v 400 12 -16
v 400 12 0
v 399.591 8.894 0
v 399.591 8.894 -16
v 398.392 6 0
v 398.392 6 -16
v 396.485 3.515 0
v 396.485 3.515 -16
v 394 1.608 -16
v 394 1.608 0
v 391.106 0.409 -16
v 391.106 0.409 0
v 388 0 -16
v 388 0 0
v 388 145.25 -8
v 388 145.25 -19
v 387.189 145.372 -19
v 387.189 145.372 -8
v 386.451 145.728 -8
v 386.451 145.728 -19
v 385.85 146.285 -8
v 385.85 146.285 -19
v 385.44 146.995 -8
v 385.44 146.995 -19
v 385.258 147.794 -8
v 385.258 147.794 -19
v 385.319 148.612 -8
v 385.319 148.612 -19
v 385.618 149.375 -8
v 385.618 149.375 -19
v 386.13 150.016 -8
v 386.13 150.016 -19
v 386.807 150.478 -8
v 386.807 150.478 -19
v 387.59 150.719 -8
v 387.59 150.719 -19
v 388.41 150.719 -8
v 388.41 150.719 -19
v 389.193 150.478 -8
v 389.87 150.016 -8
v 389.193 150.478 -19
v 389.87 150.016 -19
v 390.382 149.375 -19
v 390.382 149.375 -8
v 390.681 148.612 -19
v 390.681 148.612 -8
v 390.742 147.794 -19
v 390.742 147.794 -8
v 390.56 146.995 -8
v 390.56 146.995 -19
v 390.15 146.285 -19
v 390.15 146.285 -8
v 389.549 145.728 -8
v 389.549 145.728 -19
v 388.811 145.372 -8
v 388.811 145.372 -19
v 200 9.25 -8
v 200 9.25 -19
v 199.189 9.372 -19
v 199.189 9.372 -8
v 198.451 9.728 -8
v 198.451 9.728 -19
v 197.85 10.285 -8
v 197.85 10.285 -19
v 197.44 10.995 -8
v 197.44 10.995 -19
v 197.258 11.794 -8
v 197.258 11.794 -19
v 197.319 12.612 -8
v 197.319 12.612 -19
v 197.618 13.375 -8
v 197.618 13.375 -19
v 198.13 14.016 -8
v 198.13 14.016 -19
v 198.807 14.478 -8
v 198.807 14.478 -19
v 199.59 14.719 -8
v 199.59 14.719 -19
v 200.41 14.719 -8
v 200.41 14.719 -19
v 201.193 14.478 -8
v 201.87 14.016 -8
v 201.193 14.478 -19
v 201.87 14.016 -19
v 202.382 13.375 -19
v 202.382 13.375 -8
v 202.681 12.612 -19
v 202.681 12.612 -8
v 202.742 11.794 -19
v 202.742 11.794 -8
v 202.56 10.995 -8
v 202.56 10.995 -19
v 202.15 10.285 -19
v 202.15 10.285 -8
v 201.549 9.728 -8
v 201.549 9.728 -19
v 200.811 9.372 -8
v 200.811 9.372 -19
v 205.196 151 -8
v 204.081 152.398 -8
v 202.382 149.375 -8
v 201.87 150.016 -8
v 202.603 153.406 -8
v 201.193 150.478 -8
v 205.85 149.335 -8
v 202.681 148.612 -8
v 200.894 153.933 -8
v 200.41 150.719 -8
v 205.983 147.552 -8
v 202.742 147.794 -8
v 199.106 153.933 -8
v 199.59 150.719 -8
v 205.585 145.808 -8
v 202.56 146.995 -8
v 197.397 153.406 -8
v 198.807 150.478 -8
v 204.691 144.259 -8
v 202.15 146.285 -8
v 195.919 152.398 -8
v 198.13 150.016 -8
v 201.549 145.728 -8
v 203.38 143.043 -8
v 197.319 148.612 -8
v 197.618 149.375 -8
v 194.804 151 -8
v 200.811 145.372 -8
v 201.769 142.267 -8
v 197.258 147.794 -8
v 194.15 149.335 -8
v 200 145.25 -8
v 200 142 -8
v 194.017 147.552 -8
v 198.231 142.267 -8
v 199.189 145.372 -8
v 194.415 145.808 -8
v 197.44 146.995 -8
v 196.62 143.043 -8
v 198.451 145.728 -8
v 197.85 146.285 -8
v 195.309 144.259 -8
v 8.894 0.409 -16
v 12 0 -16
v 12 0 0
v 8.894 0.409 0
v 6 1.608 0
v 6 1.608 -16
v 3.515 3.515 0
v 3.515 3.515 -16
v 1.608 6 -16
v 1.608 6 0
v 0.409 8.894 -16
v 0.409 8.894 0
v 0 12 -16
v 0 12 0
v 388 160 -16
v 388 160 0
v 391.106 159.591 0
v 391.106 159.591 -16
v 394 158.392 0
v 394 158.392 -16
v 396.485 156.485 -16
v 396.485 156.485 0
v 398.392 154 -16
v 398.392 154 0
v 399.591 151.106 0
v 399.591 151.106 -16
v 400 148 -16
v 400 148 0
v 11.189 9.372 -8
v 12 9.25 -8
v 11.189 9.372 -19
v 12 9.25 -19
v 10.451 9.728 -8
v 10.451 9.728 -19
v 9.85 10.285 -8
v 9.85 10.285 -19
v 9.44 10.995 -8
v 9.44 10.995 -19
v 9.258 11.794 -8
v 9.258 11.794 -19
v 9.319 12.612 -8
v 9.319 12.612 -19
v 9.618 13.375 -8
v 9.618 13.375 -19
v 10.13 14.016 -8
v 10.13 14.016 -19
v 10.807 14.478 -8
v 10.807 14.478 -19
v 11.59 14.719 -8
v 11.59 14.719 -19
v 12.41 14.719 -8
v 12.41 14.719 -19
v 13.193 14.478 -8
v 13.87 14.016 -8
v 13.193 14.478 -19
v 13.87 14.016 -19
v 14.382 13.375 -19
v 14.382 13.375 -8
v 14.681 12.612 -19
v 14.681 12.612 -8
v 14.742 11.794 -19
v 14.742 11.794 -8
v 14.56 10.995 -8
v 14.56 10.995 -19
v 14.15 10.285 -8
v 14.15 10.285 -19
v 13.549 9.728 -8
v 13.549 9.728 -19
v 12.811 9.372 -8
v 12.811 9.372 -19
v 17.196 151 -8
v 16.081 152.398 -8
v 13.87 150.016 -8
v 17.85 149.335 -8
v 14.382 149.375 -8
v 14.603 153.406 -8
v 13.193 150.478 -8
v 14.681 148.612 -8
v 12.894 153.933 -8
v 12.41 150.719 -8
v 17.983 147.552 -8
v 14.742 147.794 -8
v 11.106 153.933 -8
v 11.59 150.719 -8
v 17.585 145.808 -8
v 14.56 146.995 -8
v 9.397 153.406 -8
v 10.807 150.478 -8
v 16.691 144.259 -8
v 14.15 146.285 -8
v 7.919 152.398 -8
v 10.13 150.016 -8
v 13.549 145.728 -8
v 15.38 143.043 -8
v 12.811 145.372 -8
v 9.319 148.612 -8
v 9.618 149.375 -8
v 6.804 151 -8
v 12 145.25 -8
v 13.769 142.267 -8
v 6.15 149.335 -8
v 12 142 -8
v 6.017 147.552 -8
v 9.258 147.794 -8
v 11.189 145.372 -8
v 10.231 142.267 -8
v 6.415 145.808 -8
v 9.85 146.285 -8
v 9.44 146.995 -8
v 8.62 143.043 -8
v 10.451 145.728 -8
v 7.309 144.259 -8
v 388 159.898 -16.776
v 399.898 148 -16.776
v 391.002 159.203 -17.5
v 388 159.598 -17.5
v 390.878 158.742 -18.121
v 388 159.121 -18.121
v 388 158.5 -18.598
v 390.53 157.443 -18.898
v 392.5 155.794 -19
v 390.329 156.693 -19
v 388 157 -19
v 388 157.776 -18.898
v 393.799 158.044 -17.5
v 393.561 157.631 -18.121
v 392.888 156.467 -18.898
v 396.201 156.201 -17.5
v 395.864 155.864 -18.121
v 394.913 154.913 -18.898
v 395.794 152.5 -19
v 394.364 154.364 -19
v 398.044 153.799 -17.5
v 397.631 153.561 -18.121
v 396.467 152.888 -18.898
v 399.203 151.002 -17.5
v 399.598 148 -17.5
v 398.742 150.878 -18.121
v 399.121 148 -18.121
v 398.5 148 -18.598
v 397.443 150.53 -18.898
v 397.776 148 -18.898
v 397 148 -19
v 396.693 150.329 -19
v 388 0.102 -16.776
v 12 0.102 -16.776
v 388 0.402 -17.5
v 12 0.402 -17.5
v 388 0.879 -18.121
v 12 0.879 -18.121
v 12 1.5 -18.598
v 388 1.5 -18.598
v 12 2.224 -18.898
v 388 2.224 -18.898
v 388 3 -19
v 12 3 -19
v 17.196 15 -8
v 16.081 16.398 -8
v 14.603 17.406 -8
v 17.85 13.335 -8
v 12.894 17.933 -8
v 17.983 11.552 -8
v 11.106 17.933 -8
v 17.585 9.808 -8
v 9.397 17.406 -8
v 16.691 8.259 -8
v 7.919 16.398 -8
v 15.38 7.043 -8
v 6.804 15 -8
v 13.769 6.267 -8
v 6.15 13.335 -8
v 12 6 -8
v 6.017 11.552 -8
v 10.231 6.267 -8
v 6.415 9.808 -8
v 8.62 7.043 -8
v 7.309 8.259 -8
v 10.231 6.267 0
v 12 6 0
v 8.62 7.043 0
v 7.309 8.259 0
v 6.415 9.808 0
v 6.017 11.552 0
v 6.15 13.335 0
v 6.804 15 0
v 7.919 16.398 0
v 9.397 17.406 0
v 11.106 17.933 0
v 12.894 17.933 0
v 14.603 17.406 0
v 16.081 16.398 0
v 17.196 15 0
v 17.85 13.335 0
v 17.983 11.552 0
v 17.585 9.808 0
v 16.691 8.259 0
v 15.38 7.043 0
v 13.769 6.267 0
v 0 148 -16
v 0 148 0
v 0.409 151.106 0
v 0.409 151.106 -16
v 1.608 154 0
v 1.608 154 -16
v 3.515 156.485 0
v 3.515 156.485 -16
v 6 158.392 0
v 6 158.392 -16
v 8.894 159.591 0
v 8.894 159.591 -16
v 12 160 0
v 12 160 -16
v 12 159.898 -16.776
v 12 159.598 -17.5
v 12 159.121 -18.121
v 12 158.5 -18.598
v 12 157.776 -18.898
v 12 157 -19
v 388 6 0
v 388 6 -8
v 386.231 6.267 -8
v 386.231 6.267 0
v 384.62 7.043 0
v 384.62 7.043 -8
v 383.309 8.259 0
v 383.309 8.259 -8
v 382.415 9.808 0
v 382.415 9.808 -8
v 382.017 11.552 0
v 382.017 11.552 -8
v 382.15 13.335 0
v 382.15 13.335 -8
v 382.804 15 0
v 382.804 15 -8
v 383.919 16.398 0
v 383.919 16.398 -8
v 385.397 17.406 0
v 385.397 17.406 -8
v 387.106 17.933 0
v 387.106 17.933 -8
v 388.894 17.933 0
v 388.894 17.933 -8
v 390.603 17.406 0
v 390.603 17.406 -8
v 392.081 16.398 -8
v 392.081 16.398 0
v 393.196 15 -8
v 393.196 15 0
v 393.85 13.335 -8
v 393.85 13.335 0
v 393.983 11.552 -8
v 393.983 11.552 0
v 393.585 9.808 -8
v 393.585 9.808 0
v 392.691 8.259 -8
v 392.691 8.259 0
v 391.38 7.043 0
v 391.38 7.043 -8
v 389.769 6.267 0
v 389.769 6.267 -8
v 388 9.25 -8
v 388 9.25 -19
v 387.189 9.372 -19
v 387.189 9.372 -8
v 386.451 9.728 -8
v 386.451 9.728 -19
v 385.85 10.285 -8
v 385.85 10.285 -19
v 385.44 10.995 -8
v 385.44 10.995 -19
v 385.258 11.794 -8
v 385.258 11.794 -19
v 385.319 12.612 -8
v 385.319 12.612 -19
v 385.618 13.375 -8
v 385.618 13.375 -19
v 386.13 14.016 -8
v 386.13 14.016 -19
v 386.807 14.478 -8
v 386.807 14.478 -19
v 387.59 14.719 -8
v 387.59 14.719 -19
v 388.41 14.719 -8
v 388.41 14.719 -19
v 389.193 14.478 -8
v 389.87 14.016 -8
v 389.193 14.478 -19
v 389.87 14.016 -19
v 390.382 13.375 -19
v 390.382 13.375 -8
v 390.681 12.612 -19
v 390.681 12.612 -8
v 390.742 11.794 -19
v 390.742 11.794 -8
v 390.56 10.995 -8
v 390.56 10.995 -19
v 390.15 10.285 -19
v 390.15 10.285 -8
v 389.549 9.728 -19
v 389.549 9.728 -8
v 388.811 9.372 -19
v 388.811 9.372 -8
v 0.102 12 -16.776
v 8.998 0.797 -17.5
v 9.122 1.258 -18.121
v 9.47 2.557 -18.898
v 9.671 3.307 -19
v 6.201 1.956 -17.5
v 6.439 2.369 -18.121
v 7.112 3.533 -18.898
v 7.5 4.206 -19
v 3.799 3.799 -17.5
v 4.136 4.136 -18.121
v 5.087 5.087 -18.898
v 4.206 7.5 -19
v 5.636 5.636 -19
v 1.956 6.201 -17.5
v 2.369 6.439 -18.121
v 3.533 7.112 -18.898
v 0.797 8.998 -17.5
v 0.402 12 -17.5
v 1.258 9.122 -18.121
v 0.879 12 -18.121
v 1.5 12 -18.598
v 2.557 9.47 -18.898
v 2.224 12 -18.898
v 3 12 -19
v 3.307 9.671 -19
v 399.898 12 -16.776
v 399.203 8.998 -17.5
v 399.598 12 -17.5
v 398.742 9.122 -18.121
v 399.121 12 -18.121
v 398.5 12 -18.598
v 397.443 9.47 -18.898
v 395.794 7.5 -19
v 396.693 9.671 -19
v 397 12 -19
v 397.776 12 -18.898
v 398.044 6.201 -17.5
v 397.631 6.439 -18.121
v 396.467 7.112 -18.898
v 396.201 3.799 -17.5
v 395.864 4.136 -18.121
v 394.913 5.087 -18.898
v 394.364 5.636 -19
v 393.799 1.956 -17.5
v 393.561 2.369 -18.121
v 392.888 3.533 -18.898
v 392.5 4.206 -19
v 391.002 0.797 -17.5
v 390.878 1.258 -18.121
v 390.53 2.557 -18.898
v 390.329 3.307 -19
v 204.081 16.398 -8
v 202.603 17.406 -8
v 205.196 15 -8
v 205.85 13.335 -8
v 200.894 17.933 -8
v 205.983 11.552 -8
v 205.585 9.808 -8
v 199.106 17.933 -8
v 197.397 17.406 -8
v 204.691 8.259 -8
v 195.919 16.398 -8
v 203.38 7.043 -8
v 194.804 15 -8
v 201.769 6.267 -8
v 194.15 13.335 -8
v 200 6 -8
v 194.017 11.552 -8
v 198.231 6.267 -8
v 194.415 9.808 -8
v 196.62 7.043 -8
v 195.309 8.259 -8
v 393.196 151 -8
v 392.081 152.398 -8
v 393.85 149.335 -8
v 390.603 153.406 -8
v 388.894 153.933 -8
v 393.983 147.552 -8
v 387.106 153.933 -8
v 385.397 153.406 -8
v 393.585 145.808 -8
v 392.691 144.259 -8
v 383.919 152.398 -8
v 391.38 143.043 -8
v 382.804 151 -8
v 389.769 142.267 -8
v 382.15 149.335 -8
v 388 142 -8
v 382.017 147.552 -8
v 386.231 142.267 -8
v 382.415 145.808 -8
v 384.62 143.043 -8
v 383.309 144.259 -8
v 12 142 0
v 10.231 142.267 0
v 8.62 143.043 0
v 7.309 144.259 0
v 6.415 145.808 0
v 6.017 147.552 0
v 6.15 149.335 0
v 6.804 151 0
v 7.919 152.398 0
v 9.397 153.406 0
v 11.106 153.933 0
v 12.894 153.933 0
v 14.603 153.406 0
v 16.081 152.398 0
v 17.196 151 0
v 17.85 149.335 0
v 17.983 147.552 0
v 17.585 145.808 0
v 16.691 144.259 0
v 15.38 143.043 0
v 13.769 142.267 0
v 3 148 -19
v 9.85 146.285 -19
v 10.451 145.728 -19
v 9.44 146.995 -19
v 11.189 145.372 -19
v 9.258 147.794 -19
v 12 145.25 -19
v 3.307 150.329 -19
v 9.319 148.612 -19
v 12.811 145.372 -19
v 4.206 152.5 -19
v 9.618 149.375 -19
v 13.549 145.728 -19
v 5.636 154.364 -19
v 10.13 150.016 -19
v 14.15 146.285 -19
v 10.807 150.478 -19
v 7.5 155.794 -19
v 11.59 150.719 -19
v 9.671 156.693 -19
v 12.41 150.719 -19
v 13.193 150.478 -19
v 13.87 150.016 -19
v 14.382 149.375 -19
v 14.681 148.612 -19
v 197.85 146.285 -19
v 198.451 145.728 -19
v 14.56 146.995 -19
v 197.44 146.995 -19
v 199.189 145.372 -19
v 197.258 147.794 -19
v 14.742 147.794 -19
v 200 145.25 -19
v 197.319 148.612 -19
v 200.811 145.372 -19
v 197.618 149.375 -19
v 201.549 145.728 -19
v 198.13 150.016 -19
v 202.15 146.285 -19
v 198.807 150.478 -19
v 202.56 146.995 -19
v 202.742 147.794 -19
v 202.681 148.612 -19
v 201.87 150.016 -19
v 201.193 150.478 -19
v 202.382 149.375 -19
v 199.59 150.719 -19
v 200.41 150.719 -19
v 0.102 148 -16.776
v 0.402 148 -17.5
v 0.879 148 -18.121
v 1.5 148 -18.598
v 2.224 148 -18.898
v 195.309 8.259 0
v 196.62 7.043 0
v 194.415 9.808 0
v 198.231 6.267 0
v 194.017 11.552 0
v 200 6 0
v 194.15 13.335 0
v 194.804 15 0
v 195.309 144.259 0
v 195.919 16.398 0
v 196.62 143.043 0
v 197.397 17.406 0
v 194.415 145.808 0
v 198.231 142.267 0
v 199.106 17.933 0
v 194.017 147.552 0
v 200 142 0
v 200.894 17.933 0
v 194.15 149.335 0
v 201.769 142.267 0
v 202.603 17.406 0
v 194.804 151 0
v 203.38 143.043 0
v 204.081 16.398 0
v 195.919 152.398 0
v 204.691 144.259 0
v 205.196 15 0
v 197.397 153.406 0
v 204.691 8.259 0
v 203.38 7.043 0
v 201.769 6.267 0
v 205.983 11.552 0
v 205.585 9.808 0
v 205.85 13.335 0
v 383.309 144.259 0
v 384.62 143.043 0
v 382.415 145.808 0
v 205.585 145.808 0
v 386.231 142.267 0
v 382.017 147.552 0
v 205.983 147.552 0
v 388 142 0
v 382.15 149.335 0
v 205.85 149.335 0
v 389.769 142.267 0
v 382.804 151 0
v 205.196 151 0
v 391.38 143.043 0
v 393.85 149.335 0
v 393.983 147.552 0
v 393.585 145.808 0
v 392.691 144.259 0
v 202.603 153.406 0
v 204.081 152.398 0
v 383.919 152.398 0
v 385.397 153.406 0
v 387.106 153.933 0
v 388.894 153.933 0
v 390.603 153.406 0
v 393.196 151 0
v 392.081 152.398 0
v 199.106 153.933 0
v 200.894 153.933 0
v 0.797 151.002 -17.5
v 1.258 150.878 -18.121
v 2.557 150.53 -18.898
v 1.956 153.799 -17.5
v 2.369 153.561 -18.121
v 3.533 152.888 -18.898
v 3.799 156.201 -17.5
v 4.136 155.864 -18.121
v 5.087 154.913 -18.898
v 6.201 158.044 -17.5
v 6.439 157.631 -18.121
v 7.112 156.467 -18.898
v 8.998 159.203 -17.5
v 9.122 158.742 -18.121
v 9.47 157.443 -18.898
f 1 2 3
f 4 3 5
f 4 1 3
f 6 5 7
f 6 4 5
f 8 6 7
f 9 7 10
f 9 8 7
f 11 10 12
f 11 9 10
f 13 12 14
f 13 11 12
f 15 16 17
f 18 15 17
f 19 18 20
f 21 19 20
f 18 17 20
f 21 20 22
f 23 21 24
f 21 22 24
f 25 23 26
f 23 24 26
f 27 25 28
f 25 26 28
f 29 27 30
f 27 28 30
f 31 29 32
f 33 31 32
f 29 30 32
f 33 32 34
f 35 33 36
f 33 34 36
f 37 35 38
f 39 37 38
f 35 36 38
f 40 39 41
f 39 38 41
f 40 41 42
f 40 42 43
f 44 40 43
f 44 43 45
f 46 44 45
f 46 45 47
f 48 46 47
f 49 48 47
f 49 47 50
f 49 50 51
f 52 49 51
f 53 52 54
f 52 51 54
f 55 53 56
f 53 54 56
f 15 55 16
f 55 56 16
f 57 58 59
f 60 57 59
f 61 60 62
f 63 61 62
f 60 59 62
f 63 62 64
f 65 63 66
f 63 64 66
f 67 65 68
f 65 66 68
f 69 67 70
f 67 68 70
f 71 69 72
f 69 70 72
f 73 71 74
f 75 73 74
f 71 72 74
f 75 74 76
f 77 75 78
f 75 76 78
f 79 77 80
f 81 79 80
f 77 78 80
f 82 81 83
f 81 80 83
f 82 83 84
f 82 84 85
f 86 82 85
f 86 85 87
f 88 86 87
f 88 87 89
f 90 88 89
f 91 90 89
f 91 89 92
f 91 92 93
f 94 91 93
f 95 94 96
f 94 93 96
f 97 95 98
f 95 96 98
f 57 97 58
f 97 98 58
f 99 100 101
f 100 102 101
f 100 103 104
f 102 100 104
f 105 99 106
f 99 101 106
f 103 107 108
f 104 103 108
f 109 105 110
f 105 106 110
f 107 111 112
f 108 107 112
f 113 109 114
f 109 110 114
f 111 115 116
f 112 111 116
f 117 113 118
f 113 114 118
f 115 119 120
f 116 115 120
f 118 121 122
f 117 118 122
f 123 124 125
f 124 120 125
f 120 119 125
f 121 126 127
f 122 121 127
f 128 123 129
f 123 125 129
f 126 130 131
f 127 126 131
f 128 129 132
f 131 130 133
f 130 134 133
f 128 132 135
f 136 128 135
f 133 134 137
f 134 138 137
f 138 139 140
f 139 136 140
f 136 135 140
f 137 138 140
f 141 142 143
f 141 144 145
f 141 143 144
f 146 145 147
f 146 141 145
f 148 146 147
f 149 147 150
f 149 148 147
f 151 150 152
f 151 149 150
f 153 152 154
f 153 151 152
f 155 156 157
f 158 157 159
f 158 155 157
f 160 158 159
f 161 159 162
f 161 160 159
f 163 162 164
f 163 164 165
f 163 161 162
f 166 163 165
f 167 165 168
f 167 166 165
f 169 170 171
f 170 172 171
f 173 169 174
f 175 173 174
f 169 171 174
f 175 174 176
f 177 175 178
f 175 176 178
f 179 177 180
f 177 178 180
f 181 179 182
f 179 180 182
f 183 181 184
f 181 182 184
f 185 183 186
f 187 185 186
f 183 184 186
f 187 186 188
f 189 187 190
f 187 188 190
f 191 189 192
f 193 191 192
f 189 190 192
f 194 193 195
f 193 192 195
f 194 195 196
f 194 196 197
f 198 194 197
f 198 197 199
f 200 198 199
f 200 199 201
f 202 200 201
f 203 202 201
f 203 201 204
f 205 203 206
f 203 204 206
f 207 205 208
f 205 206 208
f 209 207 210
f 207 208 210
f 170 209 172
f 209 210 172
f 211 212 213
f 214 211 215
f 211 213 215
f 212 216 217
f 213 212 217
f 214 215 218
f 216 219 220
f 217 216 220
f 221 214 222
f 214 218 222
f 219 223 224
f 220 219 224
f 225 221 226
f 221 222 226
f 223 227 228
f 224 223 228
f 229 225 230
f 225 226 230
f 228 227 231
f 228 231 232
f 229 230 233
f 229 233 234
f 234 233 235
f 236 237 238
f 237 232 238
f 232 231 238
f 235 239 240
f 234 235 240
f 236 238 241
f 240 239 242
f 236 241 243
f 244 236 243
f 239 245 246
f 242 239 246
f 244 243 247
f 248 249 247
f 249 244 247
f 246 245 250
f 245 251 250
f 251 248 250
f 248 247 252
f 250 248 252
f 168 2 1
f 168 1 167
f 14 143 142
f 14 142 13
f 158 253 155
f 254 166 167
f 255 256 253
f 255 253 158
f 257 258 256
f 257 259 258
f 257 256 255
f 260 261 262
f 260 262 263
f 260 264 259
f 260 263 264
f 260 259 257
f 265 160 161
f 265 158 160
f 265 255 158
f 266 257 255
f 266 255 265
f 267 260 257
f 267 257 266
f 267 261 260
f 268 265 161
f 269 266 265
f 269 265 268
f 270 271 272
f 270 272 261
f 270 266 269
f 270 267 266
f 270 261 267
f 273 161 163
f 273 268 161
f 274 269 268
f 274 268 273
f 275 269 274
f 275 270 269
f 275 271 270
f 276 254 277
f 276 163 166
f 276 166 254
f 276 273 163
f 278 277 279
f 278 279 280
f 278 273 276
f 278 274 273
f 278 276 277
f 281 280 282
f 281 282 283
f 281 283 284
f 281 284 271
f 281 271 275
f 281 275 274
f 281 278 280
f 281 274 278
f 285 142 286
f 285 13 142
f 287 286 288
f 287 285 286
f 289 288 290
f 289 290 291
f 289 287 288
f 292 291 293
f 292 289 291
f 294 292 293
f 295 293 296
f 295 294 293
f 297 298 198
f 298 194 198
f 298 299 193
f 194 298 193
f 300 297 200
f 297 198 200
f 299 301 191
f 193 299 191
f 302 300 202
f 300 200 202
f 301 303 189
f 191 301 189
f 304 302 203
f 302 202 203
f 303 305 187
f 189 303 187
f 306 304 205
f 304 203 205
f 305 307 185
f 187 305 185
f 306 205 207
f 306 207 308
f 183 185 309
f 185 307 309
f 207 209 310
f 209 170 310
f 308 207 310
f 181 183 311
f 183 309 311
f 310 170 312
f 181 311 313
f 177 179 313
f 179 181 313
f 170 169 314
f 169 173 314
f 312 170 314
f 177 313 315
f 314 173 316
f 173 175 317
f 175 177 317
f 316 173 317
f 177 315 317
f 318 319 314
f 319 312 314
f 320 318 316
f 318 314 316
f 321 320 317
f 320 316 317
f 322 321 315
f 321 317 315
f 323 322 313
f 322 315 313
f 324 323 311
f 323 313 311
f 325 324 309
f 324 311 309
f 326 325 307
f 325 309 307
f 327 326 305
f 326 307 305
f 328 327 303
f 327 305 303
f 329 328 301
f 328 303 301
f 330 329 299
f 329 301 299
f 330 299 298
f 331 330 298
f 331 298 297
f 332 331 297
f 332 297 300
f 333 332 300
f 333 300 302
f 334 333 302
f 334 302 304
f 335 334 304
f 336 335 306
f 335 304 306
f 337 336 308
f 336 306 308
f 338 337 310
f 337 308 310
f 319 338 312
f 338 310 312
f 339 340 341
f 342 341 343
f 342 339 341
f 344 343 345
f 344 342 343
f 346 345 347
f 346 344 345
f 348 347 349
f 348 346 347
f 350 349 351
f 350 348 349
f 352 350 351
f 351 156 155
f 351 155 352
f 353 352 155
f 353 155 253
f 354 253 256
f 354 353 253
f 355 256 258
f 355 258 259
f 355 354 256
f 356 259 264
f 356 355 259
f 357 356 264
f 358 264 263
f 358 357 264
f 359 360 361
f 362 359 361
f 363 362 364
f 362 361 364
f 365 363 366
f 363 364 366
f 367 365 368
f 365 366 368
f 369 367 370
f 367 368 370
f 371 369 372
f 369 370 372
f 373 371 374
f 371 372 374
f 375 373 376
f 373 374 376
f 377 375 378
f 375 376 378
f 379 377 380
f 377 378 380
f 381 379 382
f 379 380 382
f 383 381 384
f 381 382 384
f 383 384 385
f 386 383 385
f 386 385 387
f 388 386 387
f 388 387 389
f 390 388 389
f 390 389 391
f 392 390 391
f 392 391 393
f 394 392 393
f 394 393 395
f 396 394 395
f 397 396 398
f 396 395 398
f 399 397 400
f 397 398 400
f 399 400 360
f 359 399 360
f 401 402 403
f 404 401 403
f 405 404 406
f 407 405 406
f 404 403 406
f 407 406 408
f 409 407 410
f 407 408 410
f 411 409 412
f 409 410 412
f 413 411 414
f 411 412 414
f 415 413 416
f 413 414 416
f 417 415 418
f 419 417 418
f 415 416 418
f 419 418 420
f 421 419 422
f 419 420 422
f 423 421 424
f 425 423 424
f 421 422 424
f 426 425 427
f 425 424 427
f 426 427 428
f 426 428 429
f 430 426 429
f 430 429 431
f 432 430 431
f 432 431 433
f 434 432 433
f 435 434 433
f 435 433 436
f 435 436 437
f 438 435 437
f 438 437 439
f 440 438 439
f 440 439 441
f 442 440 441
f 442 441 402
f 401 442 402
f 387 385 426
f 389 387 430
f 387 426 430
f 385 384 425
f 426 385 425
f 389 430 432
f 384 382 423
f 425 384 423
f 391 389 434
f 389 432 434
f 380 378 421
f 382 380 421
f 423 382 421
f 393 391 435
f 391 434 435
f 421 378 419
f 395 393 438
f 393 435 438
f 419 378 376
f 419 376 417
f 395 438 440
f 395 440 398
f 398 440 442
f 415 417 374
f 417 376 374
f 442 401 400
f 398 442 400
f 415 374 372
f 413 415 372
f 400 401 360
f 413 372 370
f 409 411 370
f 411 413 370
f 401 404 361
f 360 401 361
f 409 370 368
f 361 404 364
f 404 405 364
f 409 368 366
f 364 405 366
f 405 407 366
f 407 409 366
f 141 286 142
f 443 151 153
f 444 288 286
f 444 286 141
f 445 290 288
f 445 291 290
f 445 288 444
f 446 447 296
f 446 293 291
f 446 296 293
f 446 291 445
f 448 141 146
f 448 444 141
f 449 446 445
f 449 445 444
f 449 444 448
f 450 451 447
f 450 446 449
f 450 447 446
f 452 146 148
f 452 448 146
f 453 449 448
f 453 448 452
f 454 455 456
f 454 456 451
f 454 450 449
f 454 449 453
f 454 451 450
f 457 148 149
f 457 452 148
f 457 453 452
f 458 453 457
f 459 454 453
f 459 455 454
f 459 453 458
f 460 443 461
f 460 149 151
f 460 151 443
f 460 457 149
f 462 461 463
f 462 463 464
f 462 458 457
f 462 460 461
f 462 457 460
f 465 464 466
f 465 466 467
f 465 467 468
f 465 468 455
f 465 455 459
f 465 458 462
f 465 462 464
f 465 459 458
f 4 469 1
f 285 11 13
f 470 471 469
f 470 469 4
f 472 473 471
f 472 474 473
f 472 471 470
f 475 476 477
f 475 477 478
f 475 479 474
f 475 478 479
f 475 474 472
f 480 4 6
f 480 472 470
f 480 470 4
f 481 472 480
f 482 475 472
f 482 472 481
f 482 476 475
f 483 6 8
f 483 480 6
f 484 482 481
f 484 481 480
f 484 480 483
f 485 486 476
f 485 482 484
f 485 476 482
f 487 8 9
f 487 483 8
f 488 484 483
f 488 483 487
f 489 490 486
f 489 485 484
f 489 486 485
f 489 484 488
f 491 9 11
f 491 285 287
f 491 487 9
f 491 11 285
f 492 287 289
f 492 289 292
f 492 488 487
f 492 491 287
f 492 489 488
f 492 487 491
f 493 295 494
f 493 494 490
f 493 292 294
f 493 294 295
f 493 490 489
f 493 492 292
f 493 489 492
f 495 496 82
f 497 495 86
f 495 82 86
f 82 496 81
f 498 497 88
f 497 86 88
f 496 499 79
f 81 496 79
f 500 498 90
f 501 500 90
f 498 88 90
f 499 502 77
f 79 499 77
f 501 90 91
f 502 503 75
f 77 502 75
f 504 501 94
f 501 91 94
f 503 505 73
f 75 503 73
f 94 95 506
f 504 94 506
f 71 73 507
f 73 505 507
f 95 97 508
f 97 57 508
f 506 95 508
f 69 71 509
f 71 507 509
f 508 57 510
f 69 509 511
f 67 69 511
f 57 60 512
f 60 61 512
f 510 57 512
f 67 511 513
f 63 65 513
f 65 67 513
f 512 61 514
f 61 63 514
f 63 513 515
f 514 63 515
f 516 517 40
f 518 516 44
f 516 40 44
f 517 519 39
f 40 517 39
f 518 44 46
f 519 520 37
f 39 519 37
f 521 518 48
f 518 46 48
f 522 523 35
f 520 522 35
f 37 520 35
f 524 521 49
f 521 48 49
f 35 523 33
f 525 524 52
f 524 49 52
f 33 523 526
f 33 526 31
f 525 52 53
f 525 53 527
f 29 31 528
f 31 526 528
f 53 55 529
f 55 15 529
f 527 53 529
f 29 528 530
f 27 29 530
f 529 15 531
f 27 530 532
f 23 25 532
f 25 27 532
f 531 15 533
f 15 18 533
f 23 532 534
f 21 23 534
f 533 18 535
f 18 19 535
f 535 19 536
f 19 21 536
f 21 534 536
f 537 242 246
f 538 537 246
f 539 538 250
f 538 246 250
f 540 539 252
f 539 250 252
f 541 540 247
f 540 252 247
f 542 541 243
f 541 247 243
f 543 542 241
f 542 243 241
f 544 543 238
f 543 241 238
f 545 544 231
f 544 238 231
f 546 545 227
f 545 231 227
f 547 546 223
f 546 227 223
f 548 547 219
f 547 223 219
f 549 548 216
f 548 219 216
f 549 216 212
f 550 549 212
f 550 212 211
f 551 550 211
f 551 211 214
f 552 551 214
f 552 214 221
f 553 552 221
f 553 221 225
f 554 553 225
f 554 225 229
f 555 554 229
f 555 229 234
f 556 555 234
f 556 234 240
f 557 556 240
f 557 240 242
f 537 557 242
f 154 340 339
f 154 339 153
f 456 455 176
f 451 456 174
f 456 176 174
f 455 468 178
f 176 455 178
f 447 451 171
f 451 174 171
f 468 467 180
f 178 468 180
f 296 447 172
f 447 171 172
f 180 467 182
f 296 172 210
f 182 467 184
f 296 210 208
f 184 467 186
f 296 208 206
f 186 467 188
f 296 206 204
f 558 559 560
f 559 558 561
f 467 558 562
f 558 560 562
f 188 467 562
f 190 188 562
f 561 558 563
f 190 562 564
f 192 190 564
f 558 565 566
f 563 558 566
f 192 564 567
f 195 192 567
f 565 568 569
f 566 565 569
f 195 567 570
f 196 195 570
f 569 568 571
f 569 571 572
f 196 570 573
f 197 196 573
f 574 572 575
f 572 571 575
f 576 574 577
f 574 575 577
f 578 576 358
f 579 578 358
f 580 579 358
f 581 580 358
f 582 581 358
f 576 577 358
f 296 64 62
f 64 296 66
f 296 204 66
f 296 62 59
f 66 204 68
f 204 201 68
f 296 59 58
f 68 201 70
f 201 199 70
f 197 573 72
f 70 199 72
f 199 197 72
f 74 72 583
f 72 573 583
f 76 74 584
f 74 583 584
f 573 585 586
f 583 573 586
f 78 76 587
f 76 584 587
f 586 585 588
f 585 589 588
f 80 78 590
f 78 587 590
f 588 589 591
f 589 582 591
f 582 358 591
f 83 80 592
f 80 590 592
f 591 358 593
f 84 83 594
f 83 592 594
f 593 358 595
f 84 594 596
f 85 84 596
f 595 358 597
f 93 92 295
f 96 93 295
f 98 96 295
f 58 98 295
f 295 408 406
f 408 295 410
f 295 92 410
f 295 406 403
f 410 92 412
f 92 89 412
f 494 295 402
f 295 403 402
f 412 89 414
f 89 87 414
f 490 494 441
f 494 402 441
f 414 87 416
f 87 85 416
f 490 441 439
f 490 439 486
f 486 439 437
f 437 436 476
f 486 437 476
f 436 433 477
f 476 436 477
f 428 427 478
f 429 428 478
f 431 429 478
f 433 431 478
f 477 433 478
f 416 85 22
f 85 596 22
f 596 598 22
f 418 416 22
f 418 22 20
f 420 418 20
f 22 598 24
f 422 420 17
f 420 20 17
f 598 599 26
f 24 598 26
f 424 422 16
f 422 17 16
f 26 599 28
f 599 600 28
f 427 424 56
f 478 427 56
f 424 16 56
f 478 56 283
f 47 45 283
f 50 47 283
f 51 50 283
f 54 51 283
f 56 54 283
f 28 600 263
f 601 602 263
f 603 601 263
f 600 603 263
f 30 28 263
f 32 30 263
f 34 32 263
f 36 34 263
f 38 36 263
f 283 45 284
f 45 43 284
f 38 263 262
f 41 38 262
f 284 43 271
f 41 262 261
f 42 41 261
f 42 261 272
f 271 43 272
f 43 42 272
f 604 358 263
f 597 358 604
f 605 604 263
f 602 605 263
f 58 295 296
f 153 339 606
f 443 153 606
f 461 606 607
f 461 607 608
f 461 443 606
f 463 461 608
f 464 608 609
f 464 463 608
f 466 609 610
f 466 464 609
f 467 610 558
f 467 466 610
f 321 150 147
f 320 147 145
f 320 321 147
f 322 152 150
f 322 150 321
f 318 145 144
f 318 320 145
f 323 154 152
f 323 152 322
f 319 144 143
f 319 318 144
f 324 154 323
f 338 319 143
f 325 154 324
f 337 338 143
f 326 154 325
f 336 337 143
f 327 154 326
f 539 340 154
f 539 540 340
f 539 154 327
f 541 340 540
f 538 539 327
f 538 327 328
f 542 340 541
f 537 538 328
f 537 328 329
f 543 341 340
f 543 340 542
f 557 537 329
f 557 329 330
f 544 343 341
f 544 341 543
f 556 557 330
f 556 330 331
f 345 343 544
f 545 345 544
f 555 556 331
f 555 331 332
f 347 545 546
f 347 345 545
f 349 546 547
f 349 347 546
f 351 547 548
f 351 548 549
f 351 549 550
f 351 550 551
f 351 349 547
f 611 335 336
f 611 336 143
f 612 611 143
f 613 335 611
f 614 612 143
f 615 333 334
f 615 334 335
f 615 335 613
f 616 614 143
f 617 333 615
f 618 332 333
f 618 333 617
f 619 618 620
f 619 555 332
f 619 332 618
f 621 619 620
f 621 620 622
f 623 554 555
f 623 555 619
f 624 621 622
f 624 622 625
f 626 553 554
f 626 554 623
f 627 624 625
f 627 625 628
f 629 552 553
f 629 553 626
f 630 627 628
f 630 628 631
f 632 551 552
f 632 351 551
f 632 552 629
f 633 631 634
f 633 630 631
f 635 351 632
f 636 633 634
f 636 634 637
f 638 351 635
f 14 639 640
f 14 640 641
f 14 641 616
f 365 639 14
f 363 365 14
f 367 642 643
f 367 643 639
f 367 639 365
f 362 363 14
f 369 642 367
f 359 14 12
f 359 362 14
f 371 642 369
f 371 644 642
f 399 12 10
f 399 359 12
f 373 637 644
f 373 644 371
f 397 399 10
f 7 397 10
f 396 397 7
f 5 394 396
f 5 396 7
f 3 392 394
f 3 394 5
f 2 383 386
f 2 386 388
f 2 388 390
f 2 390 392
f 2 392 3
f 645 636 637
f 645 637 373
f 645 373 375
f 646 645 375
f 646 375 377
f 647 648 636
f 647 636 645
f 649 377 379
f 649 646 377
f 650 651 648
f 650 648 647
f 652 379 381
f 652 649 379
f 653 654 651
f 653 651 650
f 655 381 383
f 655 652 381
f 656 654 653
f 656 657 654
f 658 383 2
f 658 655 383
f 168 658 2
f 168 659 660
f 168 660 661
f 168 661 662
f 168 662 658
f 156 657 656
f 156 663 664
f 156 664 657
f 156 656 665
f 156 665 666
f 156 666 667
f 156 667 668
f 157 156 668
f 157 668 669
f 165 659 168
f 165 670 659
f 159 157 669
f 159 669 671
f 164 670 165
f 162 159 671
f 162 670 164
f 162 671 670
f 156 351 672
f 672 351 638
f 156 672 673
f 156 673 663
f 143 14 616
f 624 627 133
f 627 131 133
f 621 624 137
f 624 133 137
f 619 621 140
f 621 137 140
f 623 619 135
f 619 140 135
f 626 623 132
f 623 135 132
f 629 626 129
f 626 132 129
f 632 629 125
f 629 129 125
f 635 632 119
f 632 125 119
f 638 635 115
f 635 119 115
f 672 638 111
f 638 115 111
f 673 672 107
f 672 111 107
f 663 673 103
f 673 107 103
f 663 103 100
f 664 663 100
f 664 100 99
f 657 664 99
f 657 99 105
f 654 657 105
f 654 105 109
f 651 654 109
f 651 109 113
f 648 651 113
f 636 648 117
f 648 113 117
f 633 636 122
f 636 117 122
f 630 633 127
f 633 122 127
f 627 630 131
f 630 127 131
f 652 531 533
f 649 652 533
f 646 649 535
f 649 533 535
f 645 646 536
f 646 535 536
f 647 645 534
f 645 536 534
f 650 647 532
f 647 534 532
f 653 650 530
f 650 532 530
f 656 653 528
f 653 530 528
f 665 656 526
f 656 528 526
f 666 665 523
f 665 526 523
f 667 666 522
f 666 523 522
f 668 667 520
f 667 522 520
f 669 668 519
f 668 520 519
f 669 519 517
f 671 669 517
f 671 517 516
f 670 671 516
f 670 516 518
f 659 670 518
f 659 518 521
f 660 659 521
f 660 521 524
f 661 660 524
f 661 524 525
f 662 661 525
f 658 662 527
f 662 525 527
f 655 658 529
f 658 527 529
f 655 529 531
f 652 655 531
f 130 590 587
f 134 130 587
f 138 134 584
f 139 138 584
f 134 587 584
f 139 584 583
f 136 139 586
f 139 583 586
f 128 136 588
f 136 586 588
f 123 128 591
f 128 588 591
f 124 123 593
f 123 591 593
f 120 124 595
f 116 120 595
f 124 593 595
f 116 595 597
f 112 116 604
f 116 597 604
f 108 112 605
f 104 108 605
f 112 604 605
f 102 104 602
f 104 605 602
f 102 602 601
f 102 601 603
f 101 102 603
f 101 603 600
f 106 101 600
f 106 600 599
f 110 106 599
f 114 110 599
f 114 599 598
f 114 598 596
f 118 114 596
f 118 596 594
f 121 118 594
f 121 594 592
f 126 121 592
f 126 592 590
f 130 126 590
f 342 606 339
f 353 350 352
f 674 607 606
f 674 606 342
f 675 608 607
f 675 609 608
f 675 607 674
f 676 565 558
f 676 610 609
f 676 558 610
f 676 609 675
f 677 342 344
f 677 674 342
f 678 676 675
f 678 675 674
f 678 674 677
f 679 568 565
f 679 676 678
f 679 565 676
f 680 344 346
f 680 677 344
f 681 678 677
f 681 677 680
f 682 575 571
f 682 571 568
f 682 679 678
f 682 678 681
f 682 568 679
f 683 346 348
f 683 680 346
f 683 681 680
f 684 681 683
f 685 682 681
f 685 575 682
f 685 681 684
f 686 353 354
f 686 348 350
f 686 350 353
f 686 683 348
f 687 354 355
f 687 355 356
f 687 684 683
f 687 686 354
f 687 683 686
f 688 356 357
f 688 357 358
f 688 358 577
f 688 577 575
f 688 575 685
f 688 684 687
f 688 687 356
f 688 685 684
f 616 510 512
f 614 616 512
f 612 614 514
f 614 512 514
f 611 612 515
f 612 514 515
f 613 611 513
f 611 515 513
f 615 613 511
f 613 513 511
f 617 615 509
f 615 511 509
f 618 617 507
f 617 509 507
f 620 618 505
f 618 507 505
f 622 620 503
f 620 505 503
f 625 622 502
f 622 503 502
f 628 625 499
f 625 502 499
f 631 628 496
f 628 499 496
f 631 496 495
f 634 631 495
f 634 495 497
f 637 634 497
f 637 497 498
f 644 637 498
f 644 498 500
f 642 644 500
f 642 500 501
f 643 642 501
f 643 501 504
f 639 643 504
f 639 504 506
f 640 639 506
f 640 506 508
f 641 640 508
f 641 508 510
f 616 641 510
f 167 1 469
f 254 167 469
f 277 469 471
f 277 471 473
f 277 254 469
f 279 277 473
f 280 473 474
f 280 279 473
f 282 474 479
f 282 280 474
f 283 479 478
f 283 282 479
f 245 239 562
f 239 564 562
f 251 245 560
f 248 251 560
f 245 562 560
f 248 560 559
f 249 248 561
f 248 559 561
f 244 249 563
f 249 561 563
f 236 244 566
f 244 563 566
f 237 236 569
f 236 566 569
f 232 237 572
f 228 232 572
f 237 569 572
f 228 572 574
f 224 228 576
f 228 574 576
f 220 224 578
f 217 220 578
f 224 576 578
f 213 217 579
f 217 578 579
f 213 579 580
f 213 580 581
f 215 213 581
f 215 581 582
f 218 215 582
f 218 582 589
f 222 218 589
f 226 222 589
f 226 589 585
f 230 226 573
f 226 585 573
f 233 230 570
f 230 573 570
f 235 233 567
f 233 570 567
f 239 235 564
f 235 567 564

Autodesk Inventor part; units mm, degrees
ref_plane "YZ Plane" through (0, 0, 0) normal (1, 0, 0) x (0, 1, 0)
ref_plane "XZ Plane" through (0, 0, 0) normal (0, 1, 0) x (-1, 0, 0)
ref_plane "XY Plane" through (0, 0, 0) normal (0, 0, 1) x (1, 0, 0)
sketch "Sketch1" plane through (0, 0, 0) normal (0, 0, 1) x (1, 0, 0)
  line L0 (0, 0) -> (400, 0)
  line L1 (400, 0) -> (400, 160)
  line L2 (400, 160) -> (0, 160)
  line L3 (0, 160) -> (0, 0)
  dimension "d0" = 400
  dimension "d1" = 160
extrude "Extrusion1" add sketch "Sketch1" against normal blind 19
fillet "Fillet1" radius 12 4 edges at (400, 160, -9.5) (400, 0, -9.5) (0, 0, -9.5) (0, 160, -9.5)
fillet "Fillet2" radius 3 8 edges at (3.5147, 3.5147, -19) (0, 80, -19) (3.5147, 156.4853, -19) (200, 160, -19) (396.4853, 156.4853, -19) (400, 80, -19) (396.4853, 3.5147, -19) (200, 0, -19)
sketch "Sketch3" plane through (0, 0, 0) normal (0, 0, 1) x (1, 0, 0)
  arc A0 (12, 160) -> (0, 148) centre (12, 148) ccw projected
  line L0 (0, 148) -> (0, 12) projected
  arc A1 (0, 12) -> (12, 0) centre (12, 12) ccw projected
  arc A2 (388, 0) -> (400, 12) centre (388, 12) ccw projected
  line L1 (400, 12) -> (400, 148) projected
  arc A3 (400, 148) -> (388, 160) centre (388, 148) ccw projected
  point P0 (0, 0)
  point P1 (200, 148)
  point P2 (200, 12)
  point P3 (0, 80)
  point P4 (400, 80)
  dimension "d18" = 188
  dimension "d19" = 188
  dimension "d20" = 68
  dimension "d21" = 68
hole "Hole2" at (12, 148, 0) at (200, 148, 0) at (388, 148, 0) at (388, 12, 0) at (200, 12, 0) at (12, 12, 0) direction (0, 0, -1) diameter 5.5 end through all counterbore diameter 12 counterbore depth 8
properties part number "35 - Wooden Base" material "Wood (Maple)"
